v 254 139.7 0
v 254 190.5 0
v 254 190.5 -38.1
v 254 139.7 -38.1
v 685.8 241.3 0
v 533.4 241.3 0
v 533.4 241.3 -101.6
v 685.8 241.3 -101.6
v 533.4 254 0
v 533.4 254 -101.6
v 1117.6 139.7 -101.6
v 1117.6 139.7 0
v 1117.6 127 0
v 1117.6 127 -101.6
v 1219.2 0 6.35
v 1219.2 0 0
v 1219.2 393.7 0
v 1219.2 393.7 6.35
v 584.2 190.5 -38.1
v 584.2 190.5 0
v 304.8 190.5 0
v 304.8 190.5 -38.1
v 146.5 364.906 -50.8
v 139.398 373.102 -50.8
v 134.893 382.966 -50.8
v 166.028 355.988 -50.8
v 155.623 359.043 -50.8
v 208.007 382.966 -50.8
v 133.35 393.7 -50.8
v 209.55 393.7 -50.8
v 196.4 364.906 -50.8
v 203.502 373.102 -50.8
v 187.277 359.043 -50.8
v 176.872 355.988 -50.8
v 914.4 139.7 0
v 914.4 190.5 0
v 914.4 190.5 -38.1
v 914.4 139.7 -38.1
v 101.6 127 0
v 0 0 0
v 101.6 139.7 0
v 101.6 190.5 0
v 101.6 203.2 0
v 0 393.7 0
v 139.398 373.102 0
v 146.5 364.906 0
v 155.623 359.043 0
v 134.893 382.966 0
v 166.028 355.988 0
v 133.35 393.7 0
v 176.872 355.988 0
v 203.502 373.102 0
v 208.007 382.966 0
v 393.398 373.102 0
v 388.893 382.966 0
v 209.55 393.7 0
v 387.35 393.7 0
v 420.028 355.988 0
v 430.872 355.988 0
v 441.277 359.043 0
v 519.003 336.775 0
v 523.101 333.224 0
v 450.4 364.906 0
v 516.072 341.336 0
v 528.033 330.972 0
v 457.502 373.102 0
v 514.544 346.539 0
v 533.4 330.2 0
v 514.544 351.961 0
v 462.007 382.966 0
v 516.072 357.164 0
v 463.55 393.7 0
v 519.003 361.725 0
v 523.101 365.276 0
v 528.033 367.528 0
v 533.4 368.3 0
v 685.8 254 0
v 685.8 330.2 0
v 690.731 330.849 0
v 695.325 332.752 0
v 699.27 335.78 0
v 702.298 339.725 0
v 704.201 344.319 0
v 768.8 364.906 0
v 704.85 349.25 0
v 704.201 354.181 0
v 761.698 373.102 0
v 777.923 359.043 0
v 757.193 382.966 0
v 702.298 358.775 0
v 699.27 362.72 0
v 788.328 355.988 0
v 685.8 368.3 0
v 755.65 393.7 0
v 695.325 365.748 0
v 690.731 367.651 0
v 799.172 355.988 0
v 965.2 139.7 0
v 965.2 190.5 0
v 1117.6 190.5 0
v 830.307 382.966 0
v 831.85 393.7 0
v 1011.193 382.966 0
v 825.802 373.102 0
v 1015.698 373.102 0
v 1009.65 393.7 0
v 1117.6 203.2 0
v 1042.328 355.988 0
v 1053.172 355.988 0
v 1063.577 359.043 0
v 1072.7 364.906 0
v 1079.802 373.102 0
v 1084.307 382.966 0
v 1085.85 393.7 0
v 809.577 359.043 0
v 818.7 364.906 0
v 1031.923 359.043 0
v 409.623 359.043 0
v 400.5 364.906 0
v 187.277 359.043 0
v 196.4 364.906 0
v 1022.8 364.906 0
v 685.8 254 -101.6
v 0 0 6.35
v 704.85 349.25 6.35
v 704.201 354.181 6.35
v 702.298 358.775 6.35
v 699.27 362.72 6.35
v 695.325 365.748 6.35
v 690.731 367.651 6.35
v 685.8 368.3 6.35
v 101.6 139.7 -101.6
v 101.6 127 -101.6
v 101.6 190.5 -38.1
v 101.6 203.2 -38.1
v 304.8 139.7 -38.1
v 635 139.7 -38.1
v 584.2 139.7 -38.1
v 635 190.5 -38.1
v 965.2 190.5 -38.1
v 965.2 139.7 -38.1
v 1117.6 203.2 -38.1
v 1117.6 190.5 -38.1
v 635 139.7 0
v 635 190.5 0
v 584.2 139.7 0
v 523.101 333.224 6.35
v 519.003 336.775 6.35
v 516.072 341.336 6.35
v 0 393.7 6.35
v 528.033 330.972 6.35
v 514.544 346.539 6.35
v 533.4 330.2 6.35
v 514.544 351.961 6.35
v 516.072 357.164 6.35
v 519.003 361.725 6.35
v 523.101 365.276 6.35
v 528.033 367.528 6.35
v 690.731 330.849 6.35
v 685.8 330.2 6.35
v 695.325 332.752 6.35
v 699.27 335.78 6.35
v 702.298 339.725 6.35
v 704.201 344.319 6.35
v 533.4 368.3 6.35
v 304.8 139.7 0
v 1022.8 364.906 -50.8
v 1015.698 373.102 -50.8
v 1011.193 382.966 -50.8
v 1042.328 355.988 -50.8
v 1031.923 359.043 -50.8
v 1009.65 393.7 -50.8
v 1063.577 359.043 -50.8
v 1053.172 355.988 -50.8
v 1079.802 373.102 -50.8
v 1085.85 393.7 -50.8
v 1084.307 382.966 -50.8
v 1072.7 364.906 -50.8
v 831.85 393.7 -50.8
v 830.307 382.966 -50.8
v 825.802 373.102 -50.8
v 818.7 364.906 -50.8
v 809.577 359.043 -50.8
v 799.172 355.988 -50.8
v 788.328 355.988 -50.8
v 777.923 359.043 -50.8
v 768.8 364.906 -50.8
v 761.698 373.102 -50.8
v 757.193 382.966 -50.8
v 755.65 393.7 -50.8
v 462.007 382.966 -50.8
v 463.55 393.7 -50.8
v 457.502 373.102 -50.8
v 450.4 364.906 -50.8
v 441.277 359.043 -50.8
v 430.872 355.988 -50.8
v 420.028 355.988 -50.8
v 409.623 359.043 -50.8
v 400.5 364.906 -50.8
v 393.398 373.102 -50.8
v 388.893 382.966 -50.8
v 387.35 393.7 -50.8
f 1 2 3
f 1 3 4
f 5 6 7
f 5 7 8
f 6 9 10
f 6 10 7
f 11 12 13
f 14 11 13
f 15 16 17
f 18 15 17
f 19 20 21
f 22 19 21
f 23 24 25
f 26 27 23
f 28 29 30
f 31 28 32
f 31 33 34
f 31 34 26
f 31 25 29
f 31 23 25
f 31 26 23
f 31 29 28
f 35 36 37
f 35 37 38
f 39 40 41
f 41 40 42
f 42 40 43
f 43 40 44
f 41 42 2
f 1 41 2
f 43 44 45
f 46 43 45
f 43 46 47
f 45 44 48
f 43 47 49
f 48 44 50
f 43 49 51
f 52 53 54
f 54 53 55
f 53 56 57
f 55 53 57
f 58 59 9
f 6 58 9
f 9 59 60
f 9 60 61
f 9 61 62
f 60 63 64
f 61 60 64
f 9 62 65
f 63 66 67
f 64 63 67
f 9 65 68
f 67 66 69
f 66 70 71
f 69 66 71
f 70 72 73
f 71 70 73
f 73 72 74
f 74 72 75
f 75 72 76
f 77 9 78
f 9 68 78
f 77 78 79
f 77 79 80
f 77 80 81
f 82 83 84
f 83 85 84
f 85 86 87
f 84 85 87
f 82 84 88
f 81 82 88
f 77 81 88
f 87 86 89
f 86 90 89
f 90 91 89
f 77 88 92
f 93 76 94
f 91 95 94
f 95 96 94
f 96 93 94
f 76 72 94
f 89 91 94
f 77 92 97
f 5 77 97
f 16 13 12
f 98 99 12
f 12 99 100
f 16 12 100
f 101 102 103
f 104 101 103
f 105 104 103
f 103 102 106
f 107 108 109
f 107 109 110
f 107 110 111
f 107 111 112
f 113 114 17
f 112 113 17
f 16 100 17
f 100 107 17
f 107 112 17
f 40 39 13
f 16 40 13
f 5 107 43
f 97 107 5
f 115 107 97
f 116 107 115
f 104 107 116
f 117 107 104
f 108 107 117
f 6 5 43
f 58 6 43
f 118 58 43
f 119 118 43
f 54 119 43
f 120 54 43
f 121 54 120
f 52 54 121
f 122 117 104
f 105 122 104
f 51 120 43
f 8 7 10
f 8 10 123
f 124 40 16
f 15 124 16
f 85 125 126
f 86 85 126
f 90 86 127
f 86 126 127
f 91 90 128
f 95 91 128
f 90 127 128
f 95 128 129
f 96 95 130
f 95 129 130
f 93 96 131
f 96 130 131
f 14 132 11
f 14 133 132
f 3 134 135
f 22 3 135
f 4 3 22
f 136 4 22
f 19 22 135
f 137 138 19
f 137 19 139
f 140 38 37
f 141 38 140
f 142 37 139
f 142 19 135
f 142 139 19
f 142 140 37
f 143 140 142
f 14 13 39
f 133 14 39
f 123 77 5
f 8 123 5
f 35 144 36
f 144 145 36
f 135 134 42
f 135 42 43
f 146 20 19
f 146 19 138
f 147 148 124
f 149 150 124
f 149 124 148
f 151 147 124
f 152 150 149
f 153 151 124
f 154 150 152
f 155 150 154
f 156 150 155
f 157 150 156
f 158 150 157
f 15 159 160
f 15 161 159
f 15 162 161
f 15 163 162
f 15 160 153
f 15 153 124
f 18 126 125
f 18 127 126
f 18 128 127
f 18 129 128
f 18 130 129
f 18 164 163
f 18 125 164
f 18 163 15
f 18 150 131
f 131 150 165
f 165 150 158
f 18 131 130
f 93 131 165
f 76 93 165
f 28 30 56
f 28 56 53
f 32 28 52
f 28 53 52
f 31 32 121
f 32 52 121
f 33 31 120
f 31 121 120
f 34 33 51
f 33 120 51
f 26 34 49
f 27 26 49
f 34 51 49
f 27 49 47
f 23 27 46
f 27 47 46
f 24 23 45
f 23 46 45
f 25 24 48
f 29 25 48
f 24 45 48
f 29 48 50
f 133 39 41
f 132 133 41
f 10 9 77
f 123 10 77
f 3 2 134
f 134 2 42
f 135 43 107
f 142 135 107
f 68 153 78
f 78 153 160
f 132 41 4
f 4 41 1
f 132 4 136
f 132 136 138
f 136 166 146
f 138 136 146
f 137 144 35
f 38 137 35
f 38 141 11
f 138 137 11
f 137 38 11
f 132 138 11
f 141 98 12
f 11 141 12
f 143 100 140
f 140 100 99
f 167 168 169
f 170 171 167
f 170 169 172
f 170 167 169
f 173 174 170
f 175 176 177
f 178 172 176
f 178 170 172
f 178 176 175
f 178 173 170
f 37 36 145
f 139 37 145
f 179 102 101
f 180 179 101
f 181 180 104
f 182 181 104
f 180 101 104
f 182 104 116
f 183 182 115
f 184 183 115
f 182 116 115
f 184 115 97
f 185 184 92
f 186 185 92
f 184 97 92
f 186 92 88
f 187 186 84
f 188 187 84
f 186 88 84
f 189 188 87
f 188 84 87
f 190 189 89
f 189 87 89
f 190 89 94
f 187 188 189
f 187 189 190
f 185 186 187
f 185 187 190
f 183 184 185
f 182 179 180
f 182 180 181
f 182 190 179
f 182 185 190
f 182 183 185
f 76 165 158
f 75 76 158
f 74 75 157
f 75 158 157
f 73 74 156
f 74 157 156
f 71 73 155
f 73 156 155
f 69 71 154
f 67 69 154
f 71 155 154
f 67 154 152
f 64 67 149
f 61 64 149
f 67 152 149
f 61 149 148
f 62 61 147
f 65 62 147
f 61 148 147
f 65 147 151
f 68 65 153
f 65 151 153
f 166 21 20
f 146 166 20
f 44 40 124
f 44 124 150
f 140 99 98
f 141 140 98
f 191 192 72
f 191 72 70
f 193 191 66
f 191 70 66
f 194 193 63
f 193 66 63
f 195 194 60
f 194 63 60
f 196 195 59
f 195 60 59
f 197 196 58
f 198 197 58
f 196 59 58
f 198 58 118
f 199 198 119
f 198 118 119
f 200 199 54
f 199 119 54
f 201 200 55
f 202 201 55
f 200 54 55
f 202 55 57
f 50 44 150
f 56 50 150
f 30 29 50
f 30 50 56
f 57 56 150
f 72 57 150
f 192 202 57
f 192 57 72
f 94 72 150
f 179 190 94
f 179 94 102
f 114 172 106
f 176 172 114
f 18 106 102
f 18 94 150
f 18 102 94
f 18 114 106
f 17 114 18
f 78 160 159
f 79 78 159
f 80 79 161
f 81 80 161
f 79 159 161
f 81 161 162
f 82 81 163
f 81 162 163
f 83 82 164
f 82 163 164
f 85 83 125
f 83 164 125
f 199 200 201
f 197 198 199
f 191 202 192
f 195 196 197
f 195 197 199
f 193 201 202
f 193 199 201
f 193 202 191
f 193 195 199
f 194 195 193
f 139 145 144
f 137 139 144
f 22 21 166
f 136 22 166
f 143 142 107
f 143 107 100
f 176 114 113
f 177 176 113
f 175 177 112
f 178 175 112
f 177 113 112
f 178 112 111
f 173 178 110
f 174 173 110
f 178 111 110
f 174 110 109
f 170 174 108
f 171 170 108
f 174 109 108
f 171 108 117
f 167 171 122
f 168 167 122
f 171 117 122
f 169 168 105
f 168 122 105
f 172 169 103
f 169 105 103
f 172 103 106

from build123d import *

# Parameters (mm, degrees)
F0_W      = 1219.2
F0_H      = 393.7
F1_DEPTH  = 6.35
F3_DEPTH  = 6.351
F4_W      = 152.4
F4_H      = 12.7
F5_DEPTH  = 101.6
F8_DEPTH  = 50.8
F10_DEPTH = 38.1
F11_DEPTH = 101.6
F9_W      = 50.8
F9_H      = 50.8
F12_DEPTH = 38.1


with BuildPart() as f1:
    # F0 (on Top) → F1 (new body)
    with BuildSketch(Plane.XY):
        with Locations((609.6, 196.85)):
            Rectangle(F0_W, F0_H)
    extrude(amount=F1_DEPTH)

    # F2 (on face) → F3 (cut, through all)
    with BuildSketch(Plane.XY.offset(6.35)):
        with BuildLine():
            ThreePointArc((533.4, 330.2), (546.8703841816, 335.7796158184), (552.45, 349.25))
            ThreePointArc((552.45, 349.25), (546.8703841816, 362.7203841816), (533.4, 368.3))
            ThreePointArc((533.4, 368.3), (514.35, 349.25), (533.4, 330.2))
        make_face()
        with BuildLine():
            ThreePointArc((533.4, 368.3), (546.8703841816, 362.7203841816), (552.45, 349.25))
            Line((552.45, 349.25), (666.75, 349.25))
            ThreePointArc((666.75, 349.25), (672.3296158184, 362.7203841816), (685.8, 368.3))
            Line((685.8, 368.3), (533.4, 368.3))
        make_face()
        with BuildLine():
            Line((666.75, 349.25), (552.45, 349.25))
            ThreePointArc((552.45, 349.25), (546.8703841816, 335.7796158184), (533.4, 330.2))
            Line((533.4, 330.2), (685.8, 330.2))
            ThreePointArc((685.8, 330.2), (672.3296158184, 335.7796158184), (666.75, 349.25))
        make_face()
        with BuildLine():
            ThreePointArc((685.8, 368.3), (672.3296158184, 362.7203841816), (666.75, 349.25))
            ThreePointArc((666.75, 349.25), (672.3296158184, 335.7796158184), (685.8, 330.2))
            ThreePointArc((685.8, 330.2), (699.2703841816, 335.7796158184), (704.85, 349.25))
            ThreePointArc((704.85, 349.25), (699.2703841816, 362.7203841816), (685.8, 368.3))
        make_face()
    extrude(amount=-F3_DEPTH, mode=Mode.SUBTRACT)

    # F4 (on face) → F5 (join)
    with BuildSketch(Plane(origin=(0, 0, 0), x_dir=(1, 0, 0), z_dir=(0, 0, -1))):
        with Locations((609.6, -247.65)):
            Rectangle(F4_W, F4_H)
    extrude(amount=F5_DEPTH)

    # F7 (on face) → F8 (join)
    with BuildSketch(Plane(origin=(0, 0, 0), x_dir=(1, 0, 0), z_dir=(0, 0, -1))):
        with BuildLine():
            Line((133.35, -393.7), (209.55, -393.7))
            ThreePointArc((209.55, -393.7), (171.45, -355.6), (133.35, -393.7))
        make_face()
        with BuildLine():
            Line((387.35, -393.7), (463.55, -393.7))
            ThreePointArc((463.55, -393.7), (425.45, -355.6), (387.35, -393.7))
        make_face()
        with BuildLine():
            ThreePointArc((831.85, -393.7), (793.75, -355.6), (755.65, -393.7))
            Line((755.65, -393.7), (831.85, -393.7))
        make_face()
        with BuildLine():
            ThreePointArc((1085.85, -393.7), (1047.75, -355.6), (1009.65, -393.7))
            Line((1009.65, -393.7), (1085.85, -393.7))
        make_face()
    extrude(amount=F8_DEPTH)

    # F9 (on face) → F10 (join)
    with BuildSketch(Plane(origin=(0, 0, 0), x_dir=(1, 0, 0), z_dir=(0, 0, -1))):
        Polygon((304.8, -190.5), (254, -190.5), (101.6, -190.5), (101.6, -203.2), (1117.6, -203.2), (1117.6, -190.5), (965.2, -190.5), (914.4, -190.5), (635, -190.5), (584.2, -190.5), align=None)
    extrude(amount=F10_DEPTH)

    # F9 (on face) → F11 (join)
    with BuildSketch(Plane(origin=(0, 0, 0), x_dir=(1, 0, 0), z_dir=(0, 0, -1))):
        Polygon((101.6, -139.7), (254, -139.7), (304.8, -139.7), (584.2, -139.7), (635, -139.7), (914.4, -139.7), (965.2, -139.7), (1117.6, -139.7), (1117.6, -127), (101.6, -127), align=None)
    extrude(amount=F11_DEPTH)

    # F9 (on face) → F12 (join, through all)
    with BuildSketch(Plane(origin=(0, 0, 0), x_dir=(1, 0, 0), z_dir=(0, 0, -1))):
        with Locations((279.4, -165.1)):
            Rectangle(F9_W, F9_H)
        with Locations((609.6, -165.1)):
            Rectangle(F9_W, F9_H)
        with Locations((939.8, -165.1)):
            Rectangle(F9_W, F9_H)
    extrude(amount=F12_DEPTH)


solid = f1.part
